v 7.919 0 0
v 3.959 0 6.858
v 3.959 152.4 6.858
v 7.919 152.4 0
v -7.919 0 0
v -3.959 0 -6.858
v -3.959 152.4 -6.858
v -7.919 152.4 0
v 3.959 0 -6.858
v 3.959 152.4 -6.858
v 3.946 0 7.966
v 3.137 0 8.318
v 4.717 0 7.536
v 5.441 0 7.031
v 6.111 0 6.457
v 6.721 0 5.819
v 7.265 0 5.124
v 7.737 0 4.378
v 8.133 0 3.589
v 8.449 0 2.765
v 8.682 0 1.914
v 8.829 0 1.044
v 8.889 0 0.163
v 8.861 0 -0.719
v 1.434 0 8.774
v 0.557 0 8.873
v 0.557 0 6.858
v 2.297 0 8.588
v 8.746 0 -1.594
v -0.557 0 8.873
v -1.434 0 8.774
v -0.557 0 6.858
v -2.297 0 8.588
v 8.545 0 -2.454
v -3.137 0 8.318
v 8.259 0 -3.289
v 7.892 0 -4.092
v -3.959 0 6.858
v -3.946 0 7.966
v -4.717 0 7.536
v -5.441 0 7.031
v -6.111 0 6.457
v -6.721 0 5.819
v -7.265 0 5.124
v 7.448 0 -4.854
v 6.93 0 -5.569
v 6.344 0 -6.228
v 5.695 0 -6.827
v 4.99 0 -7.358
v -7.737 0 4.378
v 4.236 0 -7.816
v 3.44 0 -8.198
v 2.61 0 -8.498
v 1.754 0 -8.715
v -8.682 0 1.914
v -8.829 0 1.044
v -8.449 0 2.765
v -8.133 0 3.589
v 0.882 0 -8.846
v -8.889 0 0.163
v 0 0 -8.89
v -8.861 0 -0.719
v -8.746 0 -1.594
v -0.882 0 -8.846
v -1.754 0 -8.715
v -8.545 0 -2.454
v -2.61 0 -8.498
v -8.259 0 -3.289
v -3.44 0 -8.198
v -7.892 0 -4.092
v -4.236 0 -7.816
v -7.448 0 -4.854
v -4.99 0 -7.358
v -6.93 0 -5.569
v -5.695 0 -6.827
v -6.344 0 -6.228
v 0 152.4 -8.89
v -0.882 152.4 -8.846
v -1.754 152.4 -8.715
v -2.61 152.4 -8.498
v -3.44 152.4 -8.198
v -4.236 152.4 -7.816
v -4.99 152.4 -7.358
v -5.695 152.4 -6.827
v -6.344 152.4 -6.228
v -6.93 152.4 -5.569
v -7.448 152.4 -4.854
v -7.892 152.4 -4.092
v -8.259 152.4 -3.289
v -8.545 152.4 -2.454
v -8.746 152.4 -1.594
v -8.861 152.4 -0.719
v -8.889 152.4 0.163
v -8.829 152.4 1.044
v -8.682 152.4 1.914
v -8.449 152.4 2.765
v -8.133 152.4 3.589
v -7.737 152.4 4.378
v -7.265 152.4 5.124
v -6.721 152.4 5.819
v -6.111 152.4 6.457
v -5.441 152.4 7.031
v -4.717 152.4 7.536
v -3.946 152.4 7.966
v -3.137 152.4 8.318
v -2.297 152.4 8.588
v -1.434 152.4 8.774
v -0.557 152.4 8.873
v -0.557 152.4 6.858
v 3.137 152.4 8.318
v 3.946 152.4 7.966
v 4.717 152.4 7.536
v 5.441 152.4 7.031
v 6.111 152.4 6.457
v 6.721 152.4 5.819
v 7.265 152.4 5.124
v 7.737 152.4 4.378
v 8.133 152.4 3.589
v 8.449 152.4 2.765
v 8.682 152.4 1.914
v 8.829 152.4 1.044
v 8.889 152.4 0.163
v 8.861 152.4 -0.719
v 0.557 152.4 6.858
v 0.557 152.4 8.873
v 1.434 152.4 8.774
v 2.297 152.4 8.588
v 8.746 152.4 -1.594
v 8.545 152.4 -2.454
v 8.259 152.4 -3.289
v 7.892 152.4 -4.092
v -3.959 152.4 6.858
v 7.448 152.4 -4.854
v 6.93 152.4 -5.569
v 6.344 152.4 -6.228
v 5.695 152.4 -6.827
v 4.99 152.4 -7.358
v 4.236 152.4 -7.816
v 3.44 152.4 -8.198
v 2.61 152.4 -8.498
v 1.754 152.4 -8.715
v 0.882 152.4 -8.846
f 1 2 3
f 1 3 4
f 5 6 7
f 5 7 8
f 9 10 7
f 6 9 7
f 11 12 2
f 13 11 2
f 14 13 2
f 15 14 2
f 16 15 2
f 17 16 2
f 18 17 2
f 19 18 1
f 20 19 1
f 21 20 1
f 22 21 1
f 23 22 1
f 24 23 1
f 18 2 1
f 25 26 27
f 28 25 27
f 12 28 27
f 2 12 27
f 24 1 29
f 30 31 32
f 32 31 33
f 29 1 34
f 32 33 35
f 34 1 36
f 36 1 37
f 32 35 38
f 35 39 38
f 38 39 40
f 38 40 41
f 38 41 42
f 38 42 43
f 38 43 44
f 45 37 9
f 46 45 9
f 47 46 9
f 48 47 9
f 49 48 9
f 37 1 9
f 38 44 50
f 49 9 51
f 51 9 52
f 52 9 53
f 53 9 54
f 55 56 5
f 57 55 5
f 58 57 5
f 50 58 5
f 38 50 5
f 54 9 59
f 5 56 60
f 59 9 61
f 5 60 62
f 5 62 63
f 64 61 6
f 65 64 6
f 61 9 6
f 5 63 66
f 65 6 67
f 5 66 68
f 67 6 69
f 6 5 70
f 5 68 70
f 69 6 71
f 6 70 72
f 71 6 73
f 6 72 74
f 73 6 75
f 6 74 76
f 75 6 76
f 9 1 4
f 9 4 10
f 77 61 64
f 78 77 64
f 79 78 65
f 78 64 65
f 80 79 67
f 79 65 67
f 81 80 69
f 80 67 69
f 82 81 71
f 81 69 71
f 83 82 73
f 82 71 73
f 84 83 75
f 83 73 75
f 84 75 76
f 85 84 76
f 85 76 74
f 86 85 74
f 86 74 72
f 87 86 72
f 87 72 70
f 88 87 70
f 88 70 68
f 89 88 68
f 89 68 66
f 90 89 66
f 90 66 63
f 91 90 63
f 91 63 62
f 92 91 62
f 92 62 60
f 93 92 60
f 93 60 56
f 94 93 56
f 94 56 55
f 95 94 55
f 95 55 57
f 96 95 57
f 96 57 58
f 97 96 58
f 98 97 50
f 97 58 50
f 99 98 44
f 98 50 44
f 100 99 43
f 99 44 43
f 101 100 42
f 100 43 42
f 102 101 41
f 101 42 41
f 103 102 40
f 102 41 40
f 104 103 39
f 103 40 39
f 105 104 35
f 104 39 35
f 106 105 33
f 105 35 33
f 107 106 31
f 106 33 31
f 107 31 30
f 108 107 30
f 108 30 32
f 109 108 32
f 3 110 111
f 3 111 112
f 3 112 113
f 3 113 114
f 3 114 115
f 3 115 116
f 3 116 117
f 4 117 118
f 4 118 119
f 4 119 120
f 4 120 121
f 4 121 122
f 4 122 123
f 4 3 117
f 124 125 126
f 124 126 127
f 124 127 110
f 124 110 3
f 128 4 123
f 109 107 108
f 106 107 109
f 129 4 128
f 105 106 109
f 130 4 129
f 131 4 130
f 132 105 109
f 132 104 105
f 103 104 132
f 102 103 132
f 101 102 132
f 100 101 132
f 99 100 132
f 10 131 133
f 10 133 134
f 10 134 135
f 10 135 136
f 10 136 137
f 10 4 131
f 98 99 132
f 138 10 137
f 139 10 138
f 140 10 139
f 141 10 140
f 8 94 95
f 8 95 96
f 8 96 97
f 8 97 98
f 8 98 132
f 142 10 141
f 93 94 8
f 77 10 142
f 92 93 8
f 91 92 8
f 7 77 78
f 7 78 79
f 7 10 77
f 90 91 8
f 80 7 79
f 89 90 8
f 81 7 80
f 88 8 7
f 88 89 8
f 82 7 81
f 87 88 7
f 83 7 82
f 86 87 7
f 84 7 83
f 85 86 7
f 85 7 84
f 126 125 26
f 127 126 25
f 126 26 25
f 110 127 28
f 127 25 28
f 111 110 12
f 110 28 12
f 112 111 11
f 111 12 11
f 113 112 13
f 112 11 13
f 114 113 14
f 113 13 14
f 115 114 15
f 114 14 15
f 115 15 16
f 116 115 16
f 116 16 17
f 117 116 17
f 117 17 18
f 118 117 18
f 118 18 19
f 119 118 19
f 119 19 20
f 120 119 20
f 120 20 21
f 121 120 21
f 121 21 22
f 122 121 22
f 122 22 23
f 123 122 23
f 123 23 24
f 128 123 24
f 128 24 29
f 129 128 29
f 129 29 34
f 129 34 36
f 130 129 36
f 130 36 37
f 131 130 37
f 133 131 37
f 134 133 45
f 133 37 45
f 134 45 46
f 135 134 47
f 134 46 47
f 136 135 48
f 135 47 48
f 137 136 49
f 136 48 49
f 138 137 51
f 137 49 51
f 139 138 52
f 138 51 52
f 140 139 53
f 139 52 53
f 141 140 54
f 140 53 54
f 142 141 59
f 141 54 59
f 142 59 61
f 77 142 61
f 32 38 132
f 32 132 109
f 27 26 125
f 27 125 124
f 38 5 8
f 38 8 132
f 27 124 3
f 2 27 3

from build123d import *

# Parameters (mm, degrees)
SKETCH1_R           = 8.89
BOSS_EXTRUDE1_DEPTH = 152.4
SKETCH2_W           = 1.113251556
SKETCH2_H           = 8.614313674
CUT_EXTRUDE1_DEPTH  = 153.917704011


with BuildPart() as part:
    # Sketch1 → Boss-Extrude1 (new body)
    with BuildSketch(Plane(origin=(0, 0, 0), x_dir=(1, 0, 0), z_dir=(0, 1, 0))):
        with Locations(Location((0, 0, 0), (0, 0, 90))):
            Circle(SKETCH1_R)
        Polygon((3.959468146, -6.858), (7.918936292, 0), (3.959468146, 6.858), (-3.959468146, 6.858), (-7.918936292, 0), (-3.959468146, -6.858), align=None, mode=Mode.SUBTRACT)
    extrude(amount=BOSS_EXTRUDE1_DEPTH)

    # Sketch2 → Cut-Extrude1 (cut, through all)
    with BuildSketch(Plane(origin=(0, 0, 0), x_dir=(-1, 0, 0), z_dir=(0, -1, 0))):
        with Locations((0, -8.353945441)):
            Rectangle(SKETCH2_W, SKETCH2_H)
    extrude(amount=-CUT_EXTRUDE1_DEPTH, mode=Mode.SUBTRACT)


solid = part.part
